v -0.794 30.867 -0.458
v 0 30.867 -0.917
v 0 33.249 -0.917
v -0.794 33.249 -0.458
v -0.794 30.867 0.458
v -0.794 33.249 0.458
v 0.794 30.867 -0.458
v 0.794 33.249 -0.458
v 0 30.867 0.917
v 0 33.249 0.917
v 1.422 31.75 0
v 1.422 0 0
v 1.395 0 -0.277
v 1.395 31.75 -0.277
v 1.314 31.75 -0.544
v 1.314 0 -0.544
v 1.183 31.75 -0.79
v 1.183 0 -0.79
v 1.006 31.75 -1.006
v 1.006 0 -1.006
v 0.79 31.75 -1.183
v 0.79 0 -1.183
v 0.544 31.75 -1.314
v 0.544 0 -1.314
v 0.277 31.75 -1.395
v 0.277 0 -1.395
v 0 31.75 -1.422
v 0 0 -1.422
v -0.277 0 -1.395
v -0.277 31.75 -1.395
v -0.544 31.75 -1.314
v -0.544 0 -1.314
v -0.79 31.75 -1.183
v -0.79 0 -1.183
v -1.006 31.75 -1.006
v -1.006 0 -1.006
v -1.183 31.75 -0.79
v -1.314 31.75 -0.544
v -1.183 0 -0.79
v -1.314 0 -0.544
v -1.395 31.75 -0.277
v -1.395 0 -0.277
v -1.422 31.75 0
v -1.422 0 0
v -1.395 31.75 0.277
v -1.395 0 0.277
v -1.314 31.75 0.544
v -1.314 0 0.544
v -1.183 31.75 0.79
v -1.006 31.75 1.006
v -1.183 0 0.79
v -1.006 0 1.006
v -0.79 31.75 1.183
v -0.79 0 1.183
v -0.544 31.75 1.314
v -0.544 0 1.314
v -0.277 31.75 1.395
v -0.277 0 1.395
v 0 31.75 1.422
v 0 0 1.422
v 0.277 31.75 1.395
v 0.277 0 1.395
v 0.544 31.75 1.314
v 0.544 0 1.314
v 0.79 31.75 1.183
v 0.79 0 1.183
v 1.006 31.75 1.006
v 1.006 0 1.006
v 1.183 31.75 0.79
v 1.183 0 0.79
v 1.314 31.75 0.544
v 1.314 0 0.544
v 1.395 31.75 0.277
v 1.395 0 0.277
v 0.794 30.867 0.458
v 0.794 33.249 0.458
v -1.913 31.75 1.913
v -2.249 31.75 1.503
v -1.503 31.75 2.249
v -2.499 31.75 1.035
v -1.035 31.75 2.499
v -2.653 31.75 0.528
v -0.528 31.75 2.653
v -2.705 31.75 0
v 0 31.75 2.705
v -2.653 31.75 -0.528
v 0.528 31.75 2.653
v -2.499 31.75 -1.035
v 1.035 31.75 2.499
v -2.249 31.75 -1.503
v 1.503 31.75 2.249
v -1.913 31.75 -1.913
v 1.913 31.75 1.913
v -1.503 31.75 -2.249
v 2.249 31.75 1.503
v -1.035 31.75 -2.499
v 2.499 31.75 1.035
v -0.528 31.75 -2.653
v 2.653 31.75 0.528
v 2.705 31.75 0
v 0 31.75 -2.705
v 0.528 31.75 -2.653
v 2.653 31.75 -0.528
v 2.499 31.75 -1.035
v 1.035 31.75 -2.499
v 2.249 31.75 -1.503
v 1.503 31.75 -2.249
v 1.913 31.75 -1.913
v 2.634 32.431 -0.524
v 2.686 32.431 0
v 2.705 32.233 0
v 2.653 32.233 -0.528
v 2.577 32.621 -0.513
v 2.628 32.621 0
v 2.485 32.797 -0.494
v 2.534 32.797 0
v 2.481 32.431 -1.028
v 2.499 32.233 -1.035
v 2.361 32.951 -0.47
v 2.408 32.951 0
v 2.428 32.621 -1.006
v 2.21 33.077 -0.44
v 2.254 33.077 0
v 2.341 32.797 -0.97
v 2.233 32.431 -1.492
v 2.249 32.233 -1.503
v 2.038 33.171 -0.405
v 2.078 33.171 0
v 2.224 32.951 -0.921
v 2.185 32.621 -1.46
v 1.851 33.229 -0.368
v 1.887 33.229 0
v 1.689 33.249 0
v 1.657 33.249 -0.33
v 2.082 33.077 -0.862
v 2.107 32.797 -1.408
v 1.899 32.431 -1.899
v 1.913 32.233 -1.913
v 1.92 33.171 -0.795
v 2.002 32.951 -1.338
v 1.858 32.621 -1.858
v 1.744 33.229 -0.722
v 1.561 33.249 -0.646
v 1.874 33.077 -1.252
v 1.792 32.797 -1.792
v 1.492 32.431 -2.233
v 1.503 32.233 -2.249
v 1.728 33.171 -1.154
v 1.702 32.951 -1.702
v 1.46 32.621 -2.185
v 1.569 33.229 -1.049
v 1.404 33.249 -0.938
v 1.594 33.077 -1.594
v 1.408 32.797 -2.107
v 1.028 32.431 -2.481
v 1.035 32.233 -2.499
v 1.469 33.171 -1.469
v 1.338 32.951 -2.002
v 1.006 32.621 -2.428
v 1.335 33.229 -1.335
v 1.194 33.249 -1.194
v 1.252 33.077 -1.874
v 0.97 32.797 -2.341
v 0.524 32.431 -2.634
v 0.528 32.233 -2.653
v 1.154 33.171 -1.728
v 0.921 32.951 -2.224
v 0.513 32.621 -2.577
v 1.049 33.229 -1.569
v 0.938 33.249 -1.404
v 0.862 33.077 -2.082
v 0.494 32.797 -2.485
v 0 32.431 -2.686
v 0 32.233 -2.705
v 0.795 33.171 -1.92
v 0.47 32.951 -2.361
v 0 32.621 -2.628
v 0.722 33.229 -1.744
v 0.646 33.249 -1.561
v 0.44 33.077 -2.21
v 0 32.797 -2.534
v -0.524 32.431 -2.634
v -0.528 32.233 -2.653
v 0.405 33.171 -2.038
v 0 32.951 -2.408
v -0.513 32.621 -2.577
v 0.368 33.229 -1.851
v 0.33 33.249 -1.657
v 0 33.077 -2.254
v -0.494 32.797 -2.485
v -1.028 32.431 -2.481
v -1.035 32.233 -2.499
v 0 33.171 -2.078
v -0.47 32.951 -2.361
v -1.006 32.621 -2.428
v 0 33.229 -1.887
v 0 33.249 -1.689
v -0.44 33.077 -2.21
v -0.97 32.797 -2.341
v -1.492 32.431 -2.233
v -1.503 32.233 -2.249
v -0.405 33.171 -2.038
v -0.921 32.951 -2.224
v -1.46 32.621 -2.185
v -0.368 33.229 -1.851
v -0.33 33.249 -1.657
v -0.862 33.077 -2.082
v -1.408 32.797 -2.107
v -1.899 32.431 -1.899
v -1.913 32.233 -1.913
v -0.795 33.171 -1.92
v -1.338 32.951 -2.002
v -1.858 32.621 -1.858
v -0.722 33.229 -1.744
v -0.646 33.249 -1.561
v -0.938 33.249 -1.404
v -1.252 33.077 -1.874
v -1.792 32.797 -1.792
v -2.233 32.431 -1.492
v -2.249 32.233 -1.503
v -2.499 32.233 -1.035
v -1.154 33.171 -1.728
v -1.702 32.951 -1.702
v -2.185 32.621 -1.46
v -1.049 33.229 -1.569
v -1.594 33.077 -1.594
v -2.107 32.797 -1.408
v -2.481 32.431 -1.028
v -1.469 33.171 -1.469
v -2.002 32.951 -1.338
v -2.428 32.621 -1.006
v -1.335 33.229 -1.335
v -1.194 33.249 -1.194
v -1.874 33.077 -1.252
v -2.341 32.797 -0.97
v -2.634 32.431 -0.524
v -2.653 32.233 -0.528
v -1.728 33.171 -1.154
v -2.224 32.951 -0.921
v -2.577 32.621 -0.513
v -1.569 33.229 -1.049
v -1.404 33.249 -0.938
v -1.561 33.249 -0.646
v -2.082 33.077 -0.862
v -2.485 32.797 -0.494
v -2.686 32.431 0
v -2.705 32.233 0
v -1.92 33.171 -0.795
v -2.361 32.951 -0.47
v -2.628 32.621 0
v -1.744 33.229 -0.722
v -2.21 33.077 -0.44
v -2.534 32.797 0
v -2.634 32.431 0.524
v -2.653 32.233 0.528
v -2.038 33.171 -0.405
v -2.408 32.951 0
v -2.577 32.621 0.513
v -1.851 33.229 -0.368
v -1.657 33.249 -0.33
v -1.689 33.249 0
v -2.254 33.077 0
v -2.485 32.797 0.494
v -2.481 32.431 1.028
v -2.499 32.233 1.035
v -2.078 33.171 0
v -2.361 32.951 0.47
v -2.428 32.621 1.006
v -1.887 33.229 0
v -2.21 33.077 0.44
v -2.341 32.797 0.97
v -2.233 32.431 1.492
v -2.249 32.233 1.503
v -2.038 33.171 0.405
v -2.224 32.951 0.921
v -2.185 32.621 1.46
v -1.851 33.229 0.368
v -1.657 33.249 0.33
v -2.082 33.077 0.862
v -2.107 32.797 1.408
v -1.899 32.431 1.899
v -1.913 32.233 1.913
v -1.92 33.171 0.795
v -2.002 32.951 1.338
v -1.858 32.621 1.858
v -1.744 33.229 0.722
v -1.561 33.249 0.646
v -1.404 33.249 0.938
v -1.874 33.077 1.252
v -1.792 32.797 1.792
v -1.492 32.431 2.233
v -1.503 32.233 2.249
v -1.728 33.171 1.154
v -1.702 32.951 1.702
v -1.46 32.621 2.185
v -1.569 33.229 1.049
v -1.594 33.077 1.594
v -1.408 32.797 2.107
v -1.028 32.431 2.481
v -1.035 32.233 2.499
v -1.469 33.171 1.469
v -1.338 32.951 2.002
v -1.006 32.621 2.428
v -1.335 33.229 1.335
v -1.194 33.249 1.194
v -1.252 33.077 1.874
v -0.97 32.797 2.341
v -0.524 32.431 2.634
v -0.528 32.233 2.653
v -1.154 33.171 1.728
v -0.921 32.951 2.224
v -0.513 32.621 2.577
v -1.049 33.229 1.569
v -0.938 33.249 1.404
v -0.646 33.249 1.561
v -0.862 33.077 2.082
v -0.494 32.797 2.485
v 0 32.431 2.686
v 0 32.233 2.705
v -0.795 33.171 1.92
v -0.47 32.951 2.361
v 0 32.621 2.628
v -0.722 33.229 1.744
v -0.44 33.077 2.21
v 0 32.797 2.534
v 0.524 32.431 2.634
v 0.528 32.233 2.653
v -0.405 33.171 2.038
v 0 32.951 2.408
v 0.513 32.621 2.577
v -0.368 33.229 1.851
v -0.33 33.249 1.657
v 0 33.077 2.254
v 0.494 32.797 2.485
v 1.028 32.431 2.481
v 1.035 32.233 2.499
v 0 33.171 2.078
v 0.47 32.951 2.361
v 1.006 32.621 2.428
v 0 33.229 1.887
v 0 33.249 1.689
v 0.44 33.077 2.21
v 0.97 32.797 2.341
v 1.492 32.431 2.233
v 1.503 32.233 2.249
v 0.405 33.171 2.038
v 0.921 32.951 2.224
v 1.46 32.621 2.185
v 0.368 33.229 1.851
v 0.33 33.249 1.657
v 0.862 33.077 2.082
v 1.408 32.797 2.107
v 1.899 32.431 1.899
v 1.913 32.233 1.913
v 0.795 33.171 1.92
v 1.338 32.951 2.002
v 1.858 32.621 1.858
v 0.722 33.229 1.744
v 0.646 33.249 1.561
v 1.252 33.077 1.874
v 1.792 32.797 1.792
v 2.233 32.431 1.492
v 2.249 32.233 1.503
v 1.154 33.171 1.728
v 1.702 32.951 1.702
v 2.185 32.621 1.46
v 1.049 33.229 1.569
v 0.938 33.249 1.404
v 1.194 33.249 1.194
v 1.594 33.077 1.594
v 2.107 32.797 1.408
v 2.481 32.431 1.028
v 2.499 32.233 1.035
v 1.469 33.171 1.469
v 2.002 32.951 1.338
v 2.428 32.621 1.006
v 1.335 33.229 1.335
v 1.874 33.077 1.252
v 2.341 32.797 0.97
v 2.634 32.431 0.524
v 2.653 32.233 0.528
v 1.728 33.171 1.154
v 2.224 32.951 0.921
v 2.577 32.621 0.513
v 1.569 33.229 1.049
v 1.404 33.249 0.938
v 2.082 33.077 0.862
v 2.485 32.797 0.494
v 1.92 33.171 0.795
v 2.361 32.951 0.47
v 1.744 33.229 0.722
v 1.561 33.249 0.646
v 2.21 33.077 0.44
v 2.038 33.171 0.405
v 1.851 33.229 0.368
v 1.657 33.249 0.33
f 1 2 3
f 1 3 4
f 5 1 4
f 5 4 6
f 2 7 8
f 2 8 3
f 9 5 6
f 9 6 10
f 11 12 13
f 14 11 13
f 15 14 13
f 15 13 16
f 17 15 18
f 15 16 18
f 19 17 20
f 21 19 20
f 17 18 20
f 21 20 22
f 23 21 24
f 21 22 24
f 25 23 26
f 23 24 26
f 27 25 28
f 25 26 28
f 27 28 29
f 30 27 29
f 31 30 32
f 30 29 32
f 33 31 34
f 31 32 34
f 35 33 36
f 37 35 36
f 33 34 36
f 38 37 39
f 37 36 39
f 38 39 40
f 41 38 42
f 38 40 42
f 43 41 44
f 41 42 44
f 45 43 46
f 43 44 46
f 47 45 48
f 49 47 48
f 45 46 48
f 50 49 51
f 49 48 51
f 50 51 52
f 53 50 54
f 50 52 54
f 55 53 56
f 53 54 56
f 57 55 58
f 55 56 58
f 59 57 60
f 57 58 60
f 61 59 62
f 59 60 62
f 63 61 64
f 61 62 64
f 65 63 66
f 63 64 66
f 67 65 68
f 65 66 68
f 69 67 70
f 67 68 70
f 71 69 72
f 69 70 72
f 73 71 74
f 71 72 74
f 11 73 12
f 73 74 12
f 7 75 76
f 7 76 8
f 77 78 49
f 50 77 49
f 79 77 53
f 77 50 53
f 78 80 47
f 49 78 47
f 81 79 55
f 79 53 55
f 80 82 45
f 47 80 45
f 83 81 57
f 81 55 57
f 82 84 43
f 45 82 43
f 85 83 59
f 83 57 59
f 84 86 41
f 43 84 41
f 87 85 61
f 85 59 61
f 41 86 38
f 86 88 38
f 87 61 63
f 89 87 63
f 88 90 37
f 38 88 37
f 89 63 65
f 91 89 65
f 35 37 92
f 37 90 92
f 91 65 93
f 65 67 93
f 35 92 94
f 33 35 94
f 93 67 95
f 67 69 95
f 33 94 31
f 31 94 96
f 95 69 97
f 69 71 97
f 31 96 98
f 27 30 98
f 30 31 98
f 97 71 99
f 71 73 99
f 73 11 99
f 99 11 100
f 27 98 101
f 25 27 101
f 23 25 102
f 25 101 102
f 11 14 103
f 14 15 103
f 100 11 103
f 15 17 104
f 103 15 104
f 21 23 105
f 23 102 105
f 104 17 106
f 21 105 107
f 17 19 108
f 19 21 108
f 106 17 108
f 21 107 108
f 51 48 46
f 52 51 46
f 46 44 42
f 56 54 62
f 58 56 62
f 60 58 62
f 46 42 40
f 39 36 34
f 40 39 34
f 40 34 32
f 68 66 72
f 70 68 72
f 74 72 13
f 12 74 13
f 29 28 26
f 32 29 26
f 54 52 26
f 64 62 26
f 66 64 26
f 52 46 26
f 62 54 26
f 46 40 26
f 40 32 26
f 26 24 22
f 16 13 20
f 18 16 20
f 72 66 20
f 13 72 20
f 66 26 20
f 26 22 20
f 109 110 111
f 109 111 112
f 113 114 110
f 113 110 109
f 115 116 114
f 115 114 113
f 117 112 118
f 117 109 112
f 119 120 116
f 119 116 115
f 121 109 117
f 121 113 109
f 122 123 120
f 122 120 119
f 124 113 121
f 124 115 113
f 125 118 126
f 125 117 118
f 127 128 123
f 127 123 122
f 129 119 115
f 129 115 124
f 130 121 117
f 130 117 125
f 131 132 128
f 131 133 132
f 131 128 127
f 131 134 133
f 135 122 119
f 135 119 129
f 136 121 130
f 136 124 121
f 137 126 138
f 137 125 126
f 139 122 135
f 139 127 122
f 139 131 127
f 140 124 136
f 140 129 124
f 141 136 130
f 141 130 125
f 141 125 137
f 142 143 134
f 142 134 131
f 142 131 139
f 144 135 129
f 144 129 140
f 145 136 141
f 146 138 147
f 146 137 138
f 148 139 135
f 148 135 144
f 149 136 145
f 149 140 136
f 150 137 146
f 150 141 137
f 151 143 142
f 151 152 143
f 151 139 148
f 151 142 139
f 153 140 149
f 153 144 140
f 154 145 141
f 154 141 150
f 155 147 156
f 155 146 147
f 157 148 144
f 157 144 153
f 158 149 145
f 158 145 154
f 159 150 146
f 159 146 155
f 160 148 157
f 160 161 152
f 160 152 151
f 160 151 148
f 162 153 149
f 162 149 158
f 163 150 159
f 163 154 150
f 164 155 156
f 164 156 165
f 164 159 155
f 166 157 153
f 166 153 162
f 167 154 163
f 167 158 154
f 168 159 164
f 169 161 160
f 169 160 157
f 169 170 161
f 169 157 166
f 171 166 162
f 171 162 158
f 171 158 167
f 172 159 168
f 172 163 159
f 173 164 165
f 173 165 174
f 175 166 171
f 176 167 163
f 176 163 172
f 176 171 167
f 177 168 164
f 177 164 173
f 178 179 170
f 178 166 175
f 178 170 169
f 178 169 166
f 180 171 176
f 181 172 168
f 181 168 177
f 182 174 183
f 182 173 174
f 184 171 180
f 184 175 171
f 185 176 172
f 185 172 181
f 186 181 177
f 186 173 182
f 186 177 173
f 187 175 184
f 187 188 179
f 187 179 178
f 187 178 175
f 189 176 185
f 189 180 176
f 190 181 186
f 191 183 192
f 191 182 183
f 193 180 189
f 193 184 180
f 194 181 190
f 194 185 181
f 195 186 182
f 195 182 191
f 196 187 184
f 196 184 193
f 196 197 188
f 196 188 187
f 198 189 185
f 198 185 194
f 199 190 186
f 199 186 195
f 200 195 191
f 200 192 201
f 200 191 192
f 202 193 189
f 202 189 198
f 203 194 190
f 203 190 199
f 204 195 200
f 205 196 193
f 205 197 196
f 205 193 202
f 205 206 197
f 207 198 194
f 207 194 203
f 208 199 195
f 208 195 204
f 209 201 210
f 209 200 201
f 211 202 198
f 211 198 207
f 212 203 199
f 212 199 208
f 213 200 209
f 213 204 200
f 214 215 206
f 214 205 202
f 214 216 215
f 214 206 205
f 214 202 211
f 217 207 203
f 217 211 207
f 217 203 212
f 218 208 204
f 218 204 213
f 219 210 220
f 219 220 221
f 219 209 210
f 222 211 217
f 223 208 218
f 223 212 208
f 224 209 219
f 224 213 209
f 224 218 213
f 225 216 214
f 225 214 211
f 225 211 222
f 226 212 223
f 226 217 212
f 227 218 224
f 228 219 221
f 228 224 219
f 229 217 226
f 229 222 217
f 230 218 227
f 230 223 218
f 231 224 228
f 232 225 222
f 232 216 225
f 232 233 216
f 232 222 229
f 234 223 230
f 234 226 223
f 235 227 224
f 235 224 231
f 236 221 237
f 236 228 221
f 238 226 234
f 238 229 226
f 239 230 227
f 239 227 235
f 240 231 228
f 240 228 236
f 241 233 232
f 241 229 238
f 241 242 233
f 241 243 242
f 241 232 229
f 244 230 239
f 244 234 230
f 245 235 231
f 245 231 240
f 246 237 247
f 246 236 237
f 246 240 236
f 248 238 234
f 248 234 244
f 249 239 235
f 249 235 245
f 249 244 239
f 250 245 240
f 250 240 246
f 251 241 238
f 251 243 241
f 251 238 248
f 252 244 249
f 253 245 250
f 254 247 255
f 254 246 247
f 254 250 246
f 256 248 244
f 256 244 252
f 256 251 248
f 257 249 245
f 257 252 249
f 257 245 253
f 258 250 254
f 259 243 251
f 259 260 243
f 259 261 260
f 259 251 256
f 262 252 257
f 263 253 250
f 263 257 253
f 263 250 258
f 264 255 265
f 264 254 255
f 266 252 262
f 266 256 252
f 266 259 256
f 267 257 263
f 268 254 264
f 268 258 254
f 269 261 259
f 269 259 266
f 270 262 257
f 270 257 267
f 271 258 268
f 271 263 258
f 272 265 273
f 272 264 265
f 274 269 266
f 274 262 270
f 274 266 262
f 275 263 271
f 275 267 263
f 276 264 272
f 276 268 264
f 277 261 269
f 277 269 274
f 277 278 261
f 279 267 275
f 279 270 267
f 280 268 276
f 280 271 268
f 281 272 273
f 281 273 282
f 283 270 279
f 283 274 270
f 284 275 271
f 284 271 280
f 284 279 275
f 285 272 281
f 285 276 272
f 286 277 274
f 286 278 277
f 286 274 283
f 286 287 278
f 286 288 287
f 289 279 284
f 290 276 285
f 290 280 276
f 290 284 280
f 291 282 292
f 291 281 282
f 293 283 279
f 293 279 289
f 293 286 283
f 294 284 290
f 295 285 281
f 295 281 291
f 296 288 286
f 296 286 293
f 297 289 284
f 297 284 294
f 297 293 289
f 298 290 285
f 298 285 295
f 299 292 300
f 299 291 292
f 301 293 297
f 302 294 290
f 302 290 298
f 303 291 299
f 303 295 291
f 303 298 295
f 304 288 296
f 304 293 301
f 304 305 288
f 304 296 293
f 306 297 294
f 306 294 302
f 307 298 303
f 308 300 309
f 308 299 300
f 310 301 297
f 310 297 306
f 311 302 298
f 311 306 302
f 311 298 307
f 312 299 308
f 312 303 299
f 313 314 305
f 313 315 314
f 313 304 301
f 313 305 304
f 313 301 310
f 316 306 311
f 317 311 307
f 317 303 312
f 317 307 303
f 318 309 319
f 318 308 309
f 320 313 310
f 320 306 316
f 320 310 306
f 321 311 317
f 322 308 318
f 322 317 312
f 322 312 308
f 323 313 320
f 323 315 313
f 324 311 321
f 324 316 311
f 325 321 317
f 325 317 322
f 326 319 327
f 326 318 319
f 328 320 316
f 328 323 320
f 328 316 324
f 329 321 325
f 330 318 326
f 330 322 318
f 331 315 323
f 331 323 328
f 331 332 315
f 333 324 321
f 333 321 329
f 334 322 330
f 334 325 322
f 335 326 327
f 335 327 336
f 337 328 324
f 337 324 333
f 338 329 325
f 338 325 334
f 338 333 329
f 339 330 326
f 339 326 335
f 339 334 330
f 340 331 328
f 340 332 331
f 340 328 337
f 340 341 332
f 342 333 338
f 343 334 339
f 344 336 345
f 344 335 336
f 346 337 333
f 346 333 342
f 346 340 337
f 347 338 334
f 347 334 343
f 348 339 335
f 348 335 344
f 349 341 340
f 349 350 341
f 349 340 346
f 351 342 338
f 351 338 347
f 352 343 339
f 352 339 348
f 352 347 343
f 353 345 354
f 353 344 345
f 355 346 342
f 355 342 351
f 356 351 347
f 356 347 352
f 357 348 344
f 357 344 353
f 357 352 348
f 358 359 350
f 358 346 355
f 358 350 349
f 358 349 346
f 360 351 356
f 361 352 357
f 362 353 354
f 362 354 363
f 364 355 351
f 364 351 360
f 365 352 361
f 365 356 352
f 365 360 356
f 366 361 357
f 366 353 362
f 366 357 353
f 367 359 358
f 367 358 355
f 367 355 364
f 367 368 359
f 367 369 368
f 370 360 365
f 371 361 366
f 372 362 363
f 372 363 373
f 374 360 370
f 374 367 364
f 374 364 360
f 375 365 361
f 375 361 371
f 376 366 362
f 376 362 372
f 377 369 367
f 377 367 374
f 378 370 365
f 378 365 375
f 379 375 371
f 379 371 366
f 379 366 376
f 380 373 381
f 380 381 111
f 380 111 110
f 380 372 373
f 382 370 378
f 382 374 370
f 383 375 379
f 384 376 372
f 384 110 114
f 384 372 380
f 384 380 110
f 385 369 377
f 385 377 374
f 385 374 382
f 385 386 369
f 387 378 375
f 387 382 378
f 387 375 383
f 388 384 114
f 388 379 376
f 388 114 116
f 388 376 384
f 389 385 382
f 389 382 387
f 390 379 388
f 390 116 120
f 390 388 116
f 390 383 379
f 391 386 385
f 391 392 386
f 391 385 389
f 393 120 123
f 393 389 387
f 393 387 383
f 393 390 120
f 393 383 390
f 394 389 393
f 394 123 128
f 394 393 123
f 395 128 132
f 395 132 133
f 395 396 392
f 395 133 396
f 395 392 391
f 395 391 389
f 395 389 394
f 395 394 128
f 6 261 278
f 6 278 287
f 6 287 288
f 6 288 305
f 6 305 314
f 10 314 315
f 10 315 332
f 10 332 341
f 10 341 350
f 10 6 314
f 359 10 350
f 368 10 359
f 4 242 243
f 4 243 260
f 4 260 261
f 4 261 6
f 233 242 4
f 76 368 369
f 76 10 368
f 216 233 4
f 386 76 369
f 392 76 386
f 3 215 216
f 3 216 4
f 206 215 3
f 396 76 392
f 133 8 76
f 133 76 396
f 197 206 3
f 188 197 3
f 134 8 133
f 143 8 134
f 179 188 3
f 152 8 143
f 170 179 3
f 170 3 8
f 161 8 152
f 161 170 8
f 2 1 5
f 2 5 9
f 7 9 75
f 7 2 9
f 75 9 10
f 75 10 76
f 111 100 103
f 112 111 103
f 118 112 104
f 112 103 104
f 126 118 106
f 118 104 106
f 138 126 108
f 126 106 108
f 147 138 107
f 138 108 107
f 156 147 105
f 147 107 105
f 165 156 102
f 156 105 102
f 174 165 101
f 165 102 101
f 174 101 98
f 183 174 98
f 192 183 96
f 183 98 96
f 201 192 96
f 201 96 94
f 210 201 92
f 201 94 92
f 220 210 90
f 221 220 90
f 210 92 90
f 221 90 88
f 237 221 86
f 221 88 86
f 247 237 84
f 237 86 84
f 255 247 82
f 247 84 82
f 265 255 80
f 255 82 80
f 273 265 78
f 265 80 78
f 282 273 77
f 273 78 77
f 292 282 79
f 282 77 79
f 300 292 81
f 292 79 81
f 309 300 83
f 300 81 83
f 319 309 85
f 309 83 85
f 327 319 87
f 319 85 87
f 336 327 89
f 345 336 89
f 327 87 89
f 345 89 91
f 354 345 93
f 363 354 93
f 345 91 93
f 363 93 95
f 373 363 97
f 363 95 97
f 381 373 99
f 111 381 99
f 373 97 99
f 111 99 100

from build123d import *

# Parameters (mm, degrees)
SKETCH1_R           = 1.4224
BOSS_EXTRUDE1_DEPTH = 31.75
SKETCH2_R           = 2.7051
BOSS_EXTRUDE2_DEPTH = 1.4986
FILLET1_R           = 1.016
CUT_EXTRUDE1_DEPTH  = 2.38125


with BuildPart() as part:
    # Sketch1 → Boss-Extrude1 (new body)
    with BuildSketch(Plane(origin=(0, 0, 0), x_dir=(1, 0, 0), z_dir=(0, 1, 0))):
        Circle(SKETCH1_R)
    extrude(amount=BOSS_EXTRUDE1_DEPTH)

    # Sketch2 → Boss-Extrude2 (add)
    with BuildSketch(Plane(origin=(0, 31.75, 0), x_dir=(1, 0, 0), z_dir=(0, 1, 0))):
        Circle(SKETCH2_R)
    extrude(amount=BOSS_EXTRUDE2_DEPTH)

    # Fillet1
    fillet1_edges = [part.edges().sort_by_distance(p)[0] for p in [
        (-2.7051, 33.2486, 0),
    ]]
    fillet(fillet1_edges, radius=FILLET1_R)

    # Sketch3 → Cut-Extrude1 (cut)
    with BuildSketch(Plane(origin=(0, 33.2486, 0), x_dir=(1, 0, 0), z_dir=(0, 1, 0))):
        Polygon((0, 0.916543552), (-0.79375, 0.458271776), (-0.79375, -0.458271776), (0, -0.916543552), (0.79375, -0.458271776), (0.79375, 0.458271776), align=None)
    extrude(amount=-CUT_EXTRUDE1_DEPTH, mode=Mode.SUBTRACT)


solid = part.part
